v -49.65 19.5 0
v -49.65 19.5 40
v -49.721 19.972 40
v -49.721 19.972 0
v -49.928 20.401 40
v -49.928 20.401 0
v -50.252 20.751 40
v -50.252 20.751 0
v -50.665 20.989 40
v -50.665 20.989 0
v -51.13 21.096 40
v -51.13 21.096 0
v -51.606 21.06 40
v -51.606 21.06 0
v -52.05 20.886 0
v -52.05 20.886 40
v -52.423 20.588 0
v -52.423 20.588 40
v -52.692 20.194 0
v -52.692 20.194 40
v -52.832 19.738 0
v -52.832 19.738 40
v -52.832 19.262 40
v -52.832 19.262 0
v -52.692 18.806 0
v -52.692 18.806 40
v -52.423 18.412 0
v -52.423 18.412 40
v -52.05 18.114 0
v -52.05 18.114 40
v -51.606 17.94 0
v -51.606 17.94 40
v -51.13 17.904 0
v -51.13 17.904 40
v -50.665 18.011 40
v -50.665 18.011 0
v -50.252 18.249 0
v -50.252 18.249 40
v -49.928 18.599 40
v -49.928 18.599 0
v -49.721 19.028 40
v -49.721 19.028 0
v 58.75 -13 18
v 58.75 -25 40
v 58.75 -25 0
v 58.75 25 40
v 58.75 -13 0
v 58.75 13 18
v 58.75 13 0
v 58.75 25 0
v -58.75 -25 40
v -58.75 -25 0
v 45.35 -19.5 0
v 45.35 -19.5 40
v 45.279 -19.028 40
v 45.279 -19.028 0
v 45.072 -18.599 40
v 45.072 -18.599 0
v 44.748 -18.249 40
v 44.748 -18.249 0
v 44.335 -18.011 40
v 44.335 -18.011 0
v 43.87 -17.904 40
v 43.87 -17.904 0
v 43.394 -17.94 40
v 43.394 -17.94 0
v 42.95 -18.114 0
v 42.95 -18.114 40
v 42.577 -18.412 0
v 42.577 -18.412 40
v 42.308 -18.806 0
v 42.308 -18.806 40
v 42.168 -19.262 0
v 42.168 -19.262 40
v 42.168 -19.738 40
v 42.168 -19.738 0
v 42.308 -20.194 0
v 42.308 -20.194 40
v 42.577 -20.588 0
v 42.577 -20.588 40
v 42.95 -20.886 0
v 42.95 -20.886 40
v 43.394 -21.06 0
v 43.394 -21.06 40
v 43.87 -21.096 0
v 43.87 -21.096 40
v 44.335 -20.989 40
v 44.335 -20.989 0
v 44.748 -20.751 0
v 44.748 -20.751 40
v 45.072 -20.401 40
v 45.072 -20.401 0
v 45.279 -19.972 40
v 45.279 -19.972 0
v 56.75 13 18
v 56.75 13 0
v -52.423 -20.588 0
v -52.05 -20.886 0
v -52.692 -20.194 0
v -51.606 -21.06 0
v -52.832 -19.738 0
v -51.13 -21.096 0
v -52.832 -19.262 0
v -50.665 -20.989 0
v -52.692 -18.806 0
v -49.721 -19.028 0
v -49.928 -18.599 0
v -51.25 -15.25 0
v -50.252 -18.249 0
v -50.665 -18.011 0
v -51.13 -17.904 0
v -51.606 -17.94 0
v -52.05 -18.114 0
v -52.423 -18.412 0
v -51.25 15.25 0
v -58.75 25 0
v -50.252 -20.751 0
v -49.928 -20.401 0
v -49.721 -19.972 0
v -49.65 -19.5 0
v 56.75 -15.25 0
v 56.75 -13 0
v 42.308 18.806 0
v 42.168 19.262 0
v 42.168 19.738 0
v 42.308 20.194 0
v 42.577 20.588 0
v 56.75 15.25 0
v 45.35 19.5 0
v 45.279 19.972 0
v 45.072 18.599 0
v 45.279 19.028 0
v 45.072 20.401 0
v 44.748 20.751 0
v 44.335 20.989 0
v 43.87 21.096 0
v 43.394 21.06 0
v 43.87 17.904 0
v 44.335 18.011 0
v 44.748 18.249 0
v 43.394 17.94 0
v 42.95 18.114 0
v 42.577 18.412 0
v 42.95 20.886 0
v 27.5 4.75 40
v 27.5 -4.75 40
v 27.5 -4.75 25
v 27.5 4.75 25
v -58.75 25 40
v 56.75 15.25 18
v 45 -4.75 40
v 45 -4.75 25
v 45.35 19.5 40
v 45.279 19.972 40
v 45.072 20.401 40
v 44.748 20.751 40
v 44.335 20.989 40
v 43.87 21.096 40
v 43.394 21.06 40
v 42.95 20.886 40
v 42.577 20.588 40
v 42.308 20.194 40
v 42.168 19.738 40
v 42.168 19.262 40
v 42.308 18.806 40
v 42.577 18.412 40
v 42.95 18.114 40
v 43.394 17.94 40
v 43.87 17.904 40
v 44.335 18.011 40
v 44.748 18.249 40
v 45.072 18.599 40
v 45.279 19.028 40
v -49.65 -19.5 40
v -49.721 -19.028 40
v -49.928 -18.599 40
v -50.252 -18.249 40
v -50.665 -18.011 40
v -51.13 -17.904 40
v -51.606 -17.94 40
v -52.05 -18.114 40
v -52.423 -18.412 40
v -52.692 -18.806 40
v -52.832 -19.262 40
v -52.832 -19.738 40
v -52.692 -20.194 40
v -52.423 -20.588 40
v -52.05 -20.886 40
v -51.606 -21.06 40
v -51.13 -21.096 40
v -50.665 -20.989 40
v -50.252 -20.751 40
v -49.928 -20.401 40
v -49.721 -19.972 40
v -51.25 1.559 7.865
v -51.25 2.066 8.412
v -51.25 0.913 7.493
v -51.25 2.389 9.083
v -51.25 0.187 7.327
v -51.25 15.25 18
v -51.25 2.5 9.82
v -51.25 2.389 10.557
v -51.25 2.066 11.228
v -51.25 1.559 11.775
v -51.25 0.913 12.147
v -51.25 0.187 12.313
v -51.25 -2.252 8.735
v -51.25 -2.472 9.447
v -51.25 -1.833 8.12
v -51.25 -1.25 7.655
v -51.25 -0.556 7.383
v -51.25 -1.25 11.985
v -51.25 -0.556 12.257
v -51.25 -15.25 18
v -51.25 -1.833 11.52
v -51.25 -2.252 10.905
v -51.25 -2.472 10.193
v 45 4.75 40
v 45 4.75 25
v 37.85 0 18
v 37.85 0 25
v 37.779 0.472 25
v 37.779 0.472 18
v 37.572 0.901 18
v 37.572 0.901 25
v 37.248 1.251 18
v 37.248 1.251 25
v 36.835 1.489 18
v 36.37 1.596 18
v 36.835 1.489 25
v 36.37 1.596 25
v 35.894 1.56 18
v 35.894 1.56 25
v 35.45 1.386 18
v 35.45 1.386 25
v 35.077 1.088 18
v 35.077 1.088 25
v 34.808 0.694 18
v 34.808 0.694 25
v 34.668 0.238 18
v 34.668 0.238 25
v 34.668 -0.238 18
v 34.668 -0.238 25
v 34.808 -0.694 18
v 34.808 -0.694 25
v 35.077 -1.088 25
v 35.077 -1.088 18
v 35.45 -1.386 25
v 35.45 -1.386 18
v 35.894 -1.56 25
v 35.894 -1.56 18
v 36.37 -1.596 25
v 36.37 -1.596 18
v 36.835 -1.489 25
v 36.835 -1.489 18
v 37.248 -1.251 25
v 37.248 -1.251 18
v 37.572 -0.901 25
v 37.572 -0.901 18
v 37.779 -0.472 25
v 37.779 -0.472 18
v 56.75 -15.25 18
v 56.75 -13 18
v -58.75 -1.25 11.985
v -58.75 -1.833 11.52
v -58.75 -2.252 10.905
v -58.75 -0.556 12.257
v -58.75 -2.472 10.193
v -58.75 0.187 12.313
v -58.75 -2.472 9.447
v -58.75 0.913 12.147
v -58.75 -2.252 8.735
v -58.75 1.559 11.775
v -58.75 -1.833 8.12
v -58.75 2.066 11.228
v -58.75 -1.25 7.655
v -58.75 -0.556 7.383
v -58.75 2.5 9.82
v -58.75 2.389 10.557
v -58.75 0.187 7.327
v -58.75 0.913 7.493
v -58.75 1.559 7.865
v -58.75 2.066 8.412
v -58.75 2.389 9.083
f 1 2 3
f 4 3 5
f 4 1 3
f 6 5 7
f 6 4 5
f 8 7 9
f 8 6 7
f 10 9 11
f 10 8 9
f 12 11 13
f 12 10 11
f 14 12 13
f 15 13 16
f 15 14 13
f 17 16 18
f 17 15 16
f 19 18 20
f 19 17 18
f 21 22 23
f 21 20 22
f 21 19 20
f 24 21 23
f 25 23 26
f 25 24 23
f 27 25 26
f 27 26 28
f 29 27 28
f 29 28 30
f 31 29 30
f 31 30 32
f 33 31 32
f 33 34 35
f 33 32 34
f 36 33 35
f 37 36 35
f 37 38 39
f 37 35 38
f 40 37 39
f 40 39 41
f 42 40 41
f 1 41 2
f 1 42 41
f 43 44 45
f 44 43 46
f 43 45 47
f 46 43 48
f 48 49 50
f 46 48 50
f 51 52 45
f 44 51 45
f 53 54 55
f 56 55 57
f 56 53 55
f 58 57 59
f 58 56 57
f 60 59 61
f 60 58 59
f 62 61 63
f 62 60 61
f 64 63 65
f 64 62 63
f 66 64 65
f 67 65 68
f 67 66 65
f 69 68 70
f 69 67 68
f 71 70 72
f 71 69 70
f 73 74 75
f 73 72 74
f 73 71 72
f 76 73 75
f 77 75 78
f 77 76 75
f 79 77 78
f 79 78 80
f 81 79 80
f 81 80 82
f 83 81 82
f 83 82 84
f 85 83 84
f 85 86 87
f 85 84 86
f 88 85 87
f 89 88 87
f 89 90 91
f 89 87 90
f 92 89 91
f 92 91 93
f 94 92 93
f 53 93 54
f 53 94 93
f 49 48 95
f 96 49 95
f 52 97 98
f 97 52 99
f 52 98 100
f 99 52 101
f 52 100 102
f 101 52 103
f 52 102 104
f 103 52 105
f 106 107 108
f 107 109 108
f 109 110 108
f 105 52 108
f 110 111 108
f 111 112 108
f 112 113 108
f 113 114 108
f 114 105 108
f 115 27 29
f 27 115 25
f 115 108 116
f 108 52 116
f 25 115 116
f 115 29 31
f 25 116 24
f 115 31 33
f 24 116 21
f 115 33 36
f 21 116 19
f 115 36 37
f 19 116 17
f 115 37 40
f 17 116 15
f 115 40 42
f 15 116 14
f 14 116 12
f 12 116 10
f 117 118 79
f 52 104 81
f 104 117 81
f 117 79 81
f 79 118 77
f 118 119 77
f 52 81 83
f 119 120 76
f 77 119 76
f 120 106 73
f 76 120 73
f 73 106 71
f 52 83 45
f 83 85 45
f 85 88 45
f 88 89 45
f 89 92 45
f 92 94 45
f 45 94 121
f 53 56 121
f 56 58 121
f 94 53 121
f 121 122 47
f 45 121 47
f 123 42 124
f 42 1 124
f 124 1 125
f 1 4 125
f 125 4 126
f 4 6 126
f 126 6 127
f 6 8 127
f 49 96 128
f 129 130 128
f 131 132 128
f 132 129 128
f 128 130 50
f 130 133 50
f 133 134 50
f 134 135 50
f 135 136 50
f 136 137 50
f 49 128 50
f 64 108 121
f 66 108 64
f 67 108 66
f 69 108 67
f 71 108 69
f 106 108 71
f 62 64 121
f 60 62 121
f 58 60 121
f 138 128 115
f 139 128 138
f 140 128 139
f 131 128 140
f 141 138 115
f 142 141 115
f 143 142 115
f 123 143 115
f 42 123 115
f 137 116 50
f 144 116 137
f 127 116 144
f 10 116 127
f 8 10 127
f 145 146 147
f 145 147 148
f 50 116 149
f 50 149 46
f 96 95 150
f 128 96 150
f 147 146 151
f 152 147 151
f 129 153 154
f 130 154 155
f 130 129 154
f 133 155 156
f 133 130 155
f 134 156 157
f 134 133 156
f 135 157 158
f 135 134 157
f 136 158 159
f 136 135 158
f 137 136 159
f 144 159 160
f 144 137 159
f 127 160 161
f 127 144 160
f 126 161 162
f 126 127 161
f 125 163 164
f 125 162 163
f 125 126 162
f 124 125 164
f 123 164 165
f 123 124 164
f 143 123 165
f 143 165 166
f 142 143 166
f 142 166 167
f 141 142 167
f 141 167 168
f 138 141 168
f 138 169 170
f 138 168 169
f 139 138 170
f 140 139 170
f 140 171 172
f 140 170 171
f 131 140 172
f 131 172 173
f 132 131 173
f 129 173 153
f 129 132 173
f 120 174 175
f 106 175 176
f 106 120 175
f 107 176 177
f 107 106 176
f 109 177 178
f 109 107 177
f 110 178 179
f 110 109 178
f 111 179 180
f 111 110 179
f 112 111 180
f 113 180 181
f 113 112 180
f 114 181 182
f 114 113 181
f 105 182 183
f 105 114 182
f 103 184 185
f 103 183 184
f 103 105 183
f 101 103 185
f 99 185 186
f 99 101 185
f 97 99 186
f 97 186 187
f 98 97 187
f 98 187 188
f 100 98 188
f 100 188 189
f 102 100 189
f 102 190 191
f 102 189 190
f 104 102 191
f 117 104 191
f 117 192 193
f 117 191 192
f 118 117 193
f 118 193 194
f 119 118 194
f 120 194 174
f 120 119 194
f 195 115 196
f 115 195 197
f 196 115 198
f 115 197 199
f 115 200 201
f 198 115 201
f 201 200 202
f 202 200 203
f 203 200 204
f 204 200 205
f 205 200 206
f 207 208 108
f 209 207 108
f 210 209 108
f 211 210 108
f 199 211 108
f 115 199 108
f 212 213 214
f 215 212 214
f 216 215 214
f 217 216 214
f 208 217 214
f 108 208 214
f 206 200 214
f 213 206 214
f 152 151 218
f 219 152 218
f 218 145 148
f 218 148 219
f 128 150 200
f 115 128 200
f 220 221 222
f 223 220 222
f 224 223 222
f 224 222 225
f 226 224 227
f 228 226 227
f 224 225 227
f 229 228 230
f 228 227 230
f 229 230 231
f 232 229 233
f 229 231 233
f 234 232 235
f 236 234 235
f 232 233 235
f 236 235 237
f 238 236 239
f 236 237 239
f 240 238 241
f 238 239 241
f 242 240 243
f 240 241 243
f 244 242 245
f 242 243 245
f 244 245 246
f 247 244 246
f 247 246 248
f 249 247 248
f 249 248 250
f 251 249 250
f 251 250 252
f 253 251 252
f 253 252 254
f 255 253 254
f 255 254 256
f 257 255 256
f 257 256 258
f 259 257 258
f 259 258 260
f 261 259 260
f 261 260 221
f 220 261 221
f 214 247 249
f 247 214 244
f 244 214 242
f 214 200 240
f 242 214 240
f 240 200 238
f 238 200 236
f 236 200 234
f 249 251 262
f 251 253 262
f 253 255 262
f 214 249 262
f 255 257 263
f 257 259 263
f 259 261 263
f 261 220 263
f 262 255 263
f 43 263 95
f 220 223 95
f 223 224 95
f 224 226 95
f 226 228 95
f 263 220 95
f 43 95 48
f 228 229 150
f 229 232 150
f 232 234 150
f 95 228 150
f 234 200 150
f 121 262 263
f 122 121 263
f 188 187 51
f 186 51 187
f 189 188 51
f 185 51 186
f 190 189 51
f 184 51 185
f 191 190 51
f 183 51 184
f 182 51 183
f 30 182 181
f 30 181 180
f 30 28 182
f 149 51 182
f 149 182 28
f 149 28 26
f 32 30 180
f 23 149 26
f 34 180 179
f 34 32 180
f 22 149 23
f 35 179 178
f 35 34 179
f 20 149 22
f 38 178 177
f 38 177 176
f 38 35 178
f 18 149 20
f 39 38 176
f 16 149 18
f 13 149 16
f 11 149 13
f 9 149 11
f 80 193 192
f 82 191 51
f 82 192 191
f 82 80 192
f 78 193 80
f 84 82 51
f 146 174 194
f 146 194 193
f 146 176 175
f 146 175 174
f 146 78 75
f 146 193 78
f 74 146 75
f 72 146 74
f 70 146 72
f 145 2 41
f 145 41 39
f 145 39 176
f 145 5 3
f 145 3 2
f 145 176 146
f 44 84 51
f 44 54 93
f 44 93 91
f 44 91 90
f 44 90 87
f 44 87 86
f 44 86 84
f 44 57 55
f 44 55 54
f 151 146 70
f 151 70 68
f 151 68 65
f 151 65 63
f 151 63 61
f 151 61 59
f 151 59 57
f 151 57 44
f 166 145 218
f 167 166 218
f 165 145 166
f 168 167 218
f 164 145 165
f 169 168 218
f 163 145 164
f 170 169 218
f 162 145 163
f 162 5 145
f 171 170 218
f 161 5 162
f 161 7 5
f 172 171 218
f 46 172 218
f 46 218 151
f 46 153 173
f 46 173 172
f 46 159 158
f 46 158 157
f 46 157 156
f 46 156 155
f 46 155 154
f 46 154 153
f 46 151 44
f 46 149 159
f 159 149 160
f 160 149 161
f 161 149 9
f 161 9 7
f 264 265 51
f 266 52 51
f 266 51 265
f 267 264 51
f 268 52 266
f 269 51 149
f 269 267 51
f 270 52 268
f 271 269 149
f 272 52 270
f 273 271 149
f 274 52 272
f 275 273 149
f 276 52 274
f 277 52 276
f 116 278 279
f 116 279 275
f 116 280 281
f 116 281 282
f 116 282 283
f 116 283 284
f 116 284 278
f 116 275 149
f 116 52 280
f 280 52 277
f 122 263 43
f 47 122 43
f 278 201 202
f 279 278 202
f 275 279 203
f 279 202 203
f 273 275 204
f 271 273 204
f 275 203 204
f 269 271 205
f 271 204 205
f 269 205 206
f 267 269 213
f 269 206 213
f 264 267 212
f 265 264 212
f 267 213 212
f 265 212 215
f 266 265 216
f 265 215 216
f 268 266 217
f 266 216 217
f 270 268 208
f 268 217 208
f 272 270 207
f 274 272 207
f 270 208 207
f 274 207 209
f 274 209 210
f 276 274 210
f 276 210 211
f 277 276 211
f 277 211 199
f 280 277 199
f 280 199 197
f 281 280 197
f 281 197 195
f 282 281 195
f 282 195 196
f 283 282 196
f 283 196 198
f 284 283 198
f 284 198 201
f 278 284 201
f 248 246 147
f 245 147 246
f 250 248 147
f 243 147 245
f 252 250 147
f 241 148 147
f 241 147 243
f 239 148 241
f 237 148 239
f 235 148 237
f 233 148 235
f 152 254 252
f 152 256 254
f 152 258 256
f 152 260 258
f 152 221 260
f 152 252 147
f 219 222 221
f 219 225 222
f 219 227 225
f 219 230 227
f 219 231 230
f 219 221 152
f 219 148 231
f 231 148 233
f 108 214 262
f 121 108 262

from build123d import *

# Parameters (mm, degrees)
SKETCH_W        = 117.5
SKETCH_H        = 50
PAD_DEPTH       = 40
POCKET_DEPTH    = 18
SKETCH002_R     = 1.6
POCKET001_DEPTH = 40.001
SKETCH003_W     = 17.5
SKETCH003_H     = 9.5
POCKET002_DEPTH = 15
SKETCH004_R     = 1.6
POCKET003_DEPTH = 25.001
SKETCH006_R     = 2.5
POCKET004_DEPTH = 117.501


with BuildPart() as part:
    # Sketch → Pad (new body)
    with BuildSketch(Plane.XY):
        Rectangle(SKETCH_W, SKETCH_H)
    extrude(amount=PAD_DEPTH)

    # Sketch001 → Pocket (cut, symmetric)
    with BuildSketch(Plane.XY):
        Polygon((56.75, -13), (58.75, -13), (58.75, 13), (56.75, 13), (56.75, 15.25), (-51.25, 15.25), (-51.25, -15.25), (56.75, -15.25), align=None)
    extrude(amount=POCKET_DEPTH, both=True, mode=Mode.SUBTRACT)

    # Sketch002 → Pocket001 (cut, through all)
    with BuildSketch(Plane.XY):
        with Locations((-51.25, 19.5)):
            Circle(SKETCH002_R)
        with Locations((43.75, 19.5)):
            Circle(SKETCH002_R)
        with Locations((-51.25, -19.5)):
            Circle(SKETCH002_R)
        with Locations((43.75, -19.5)):
            Circle(SKETCH002_R)
    extrude(amount=POCKET001_DEPTH, mode=Mode.SUBTRACT)

    # Sketch003 (on Face5 of Pocket001) → Pocket002 (cut)
    with BuildSketch(Plane.XY.offset(40)):
        with Locations((36.25, 0)):
            Rectangle(SKETCH003_W, SKETCH003_H)
    extrude(amount=-POCKET002_DEPTH, mode=Mode.SUBTRACT)

    # Sketch004 (on Face23 of Pocket002) → Pocket003 (cut, through all)
    with BuildSketch(Plane.XY.offset(25)):
        with Locations((36.25, 0)):
            Circle(SKETCH004_R)
    extrude(amount=-POCKET003_DEPTH, mode=Mode.SUBTRACT)

    # Sketch006 (on DatumPlane) → Pocket004 (cut, through all)
    with BuildSketch(Plane.YZ.offset(58.75)):
        with Locations((0, 9.82)):
            Circle(SKETCH006_R)
    extrude(amount=-POCKET004_DEPTH, mode=Mode.SUBTRACT)


solid = part.part
